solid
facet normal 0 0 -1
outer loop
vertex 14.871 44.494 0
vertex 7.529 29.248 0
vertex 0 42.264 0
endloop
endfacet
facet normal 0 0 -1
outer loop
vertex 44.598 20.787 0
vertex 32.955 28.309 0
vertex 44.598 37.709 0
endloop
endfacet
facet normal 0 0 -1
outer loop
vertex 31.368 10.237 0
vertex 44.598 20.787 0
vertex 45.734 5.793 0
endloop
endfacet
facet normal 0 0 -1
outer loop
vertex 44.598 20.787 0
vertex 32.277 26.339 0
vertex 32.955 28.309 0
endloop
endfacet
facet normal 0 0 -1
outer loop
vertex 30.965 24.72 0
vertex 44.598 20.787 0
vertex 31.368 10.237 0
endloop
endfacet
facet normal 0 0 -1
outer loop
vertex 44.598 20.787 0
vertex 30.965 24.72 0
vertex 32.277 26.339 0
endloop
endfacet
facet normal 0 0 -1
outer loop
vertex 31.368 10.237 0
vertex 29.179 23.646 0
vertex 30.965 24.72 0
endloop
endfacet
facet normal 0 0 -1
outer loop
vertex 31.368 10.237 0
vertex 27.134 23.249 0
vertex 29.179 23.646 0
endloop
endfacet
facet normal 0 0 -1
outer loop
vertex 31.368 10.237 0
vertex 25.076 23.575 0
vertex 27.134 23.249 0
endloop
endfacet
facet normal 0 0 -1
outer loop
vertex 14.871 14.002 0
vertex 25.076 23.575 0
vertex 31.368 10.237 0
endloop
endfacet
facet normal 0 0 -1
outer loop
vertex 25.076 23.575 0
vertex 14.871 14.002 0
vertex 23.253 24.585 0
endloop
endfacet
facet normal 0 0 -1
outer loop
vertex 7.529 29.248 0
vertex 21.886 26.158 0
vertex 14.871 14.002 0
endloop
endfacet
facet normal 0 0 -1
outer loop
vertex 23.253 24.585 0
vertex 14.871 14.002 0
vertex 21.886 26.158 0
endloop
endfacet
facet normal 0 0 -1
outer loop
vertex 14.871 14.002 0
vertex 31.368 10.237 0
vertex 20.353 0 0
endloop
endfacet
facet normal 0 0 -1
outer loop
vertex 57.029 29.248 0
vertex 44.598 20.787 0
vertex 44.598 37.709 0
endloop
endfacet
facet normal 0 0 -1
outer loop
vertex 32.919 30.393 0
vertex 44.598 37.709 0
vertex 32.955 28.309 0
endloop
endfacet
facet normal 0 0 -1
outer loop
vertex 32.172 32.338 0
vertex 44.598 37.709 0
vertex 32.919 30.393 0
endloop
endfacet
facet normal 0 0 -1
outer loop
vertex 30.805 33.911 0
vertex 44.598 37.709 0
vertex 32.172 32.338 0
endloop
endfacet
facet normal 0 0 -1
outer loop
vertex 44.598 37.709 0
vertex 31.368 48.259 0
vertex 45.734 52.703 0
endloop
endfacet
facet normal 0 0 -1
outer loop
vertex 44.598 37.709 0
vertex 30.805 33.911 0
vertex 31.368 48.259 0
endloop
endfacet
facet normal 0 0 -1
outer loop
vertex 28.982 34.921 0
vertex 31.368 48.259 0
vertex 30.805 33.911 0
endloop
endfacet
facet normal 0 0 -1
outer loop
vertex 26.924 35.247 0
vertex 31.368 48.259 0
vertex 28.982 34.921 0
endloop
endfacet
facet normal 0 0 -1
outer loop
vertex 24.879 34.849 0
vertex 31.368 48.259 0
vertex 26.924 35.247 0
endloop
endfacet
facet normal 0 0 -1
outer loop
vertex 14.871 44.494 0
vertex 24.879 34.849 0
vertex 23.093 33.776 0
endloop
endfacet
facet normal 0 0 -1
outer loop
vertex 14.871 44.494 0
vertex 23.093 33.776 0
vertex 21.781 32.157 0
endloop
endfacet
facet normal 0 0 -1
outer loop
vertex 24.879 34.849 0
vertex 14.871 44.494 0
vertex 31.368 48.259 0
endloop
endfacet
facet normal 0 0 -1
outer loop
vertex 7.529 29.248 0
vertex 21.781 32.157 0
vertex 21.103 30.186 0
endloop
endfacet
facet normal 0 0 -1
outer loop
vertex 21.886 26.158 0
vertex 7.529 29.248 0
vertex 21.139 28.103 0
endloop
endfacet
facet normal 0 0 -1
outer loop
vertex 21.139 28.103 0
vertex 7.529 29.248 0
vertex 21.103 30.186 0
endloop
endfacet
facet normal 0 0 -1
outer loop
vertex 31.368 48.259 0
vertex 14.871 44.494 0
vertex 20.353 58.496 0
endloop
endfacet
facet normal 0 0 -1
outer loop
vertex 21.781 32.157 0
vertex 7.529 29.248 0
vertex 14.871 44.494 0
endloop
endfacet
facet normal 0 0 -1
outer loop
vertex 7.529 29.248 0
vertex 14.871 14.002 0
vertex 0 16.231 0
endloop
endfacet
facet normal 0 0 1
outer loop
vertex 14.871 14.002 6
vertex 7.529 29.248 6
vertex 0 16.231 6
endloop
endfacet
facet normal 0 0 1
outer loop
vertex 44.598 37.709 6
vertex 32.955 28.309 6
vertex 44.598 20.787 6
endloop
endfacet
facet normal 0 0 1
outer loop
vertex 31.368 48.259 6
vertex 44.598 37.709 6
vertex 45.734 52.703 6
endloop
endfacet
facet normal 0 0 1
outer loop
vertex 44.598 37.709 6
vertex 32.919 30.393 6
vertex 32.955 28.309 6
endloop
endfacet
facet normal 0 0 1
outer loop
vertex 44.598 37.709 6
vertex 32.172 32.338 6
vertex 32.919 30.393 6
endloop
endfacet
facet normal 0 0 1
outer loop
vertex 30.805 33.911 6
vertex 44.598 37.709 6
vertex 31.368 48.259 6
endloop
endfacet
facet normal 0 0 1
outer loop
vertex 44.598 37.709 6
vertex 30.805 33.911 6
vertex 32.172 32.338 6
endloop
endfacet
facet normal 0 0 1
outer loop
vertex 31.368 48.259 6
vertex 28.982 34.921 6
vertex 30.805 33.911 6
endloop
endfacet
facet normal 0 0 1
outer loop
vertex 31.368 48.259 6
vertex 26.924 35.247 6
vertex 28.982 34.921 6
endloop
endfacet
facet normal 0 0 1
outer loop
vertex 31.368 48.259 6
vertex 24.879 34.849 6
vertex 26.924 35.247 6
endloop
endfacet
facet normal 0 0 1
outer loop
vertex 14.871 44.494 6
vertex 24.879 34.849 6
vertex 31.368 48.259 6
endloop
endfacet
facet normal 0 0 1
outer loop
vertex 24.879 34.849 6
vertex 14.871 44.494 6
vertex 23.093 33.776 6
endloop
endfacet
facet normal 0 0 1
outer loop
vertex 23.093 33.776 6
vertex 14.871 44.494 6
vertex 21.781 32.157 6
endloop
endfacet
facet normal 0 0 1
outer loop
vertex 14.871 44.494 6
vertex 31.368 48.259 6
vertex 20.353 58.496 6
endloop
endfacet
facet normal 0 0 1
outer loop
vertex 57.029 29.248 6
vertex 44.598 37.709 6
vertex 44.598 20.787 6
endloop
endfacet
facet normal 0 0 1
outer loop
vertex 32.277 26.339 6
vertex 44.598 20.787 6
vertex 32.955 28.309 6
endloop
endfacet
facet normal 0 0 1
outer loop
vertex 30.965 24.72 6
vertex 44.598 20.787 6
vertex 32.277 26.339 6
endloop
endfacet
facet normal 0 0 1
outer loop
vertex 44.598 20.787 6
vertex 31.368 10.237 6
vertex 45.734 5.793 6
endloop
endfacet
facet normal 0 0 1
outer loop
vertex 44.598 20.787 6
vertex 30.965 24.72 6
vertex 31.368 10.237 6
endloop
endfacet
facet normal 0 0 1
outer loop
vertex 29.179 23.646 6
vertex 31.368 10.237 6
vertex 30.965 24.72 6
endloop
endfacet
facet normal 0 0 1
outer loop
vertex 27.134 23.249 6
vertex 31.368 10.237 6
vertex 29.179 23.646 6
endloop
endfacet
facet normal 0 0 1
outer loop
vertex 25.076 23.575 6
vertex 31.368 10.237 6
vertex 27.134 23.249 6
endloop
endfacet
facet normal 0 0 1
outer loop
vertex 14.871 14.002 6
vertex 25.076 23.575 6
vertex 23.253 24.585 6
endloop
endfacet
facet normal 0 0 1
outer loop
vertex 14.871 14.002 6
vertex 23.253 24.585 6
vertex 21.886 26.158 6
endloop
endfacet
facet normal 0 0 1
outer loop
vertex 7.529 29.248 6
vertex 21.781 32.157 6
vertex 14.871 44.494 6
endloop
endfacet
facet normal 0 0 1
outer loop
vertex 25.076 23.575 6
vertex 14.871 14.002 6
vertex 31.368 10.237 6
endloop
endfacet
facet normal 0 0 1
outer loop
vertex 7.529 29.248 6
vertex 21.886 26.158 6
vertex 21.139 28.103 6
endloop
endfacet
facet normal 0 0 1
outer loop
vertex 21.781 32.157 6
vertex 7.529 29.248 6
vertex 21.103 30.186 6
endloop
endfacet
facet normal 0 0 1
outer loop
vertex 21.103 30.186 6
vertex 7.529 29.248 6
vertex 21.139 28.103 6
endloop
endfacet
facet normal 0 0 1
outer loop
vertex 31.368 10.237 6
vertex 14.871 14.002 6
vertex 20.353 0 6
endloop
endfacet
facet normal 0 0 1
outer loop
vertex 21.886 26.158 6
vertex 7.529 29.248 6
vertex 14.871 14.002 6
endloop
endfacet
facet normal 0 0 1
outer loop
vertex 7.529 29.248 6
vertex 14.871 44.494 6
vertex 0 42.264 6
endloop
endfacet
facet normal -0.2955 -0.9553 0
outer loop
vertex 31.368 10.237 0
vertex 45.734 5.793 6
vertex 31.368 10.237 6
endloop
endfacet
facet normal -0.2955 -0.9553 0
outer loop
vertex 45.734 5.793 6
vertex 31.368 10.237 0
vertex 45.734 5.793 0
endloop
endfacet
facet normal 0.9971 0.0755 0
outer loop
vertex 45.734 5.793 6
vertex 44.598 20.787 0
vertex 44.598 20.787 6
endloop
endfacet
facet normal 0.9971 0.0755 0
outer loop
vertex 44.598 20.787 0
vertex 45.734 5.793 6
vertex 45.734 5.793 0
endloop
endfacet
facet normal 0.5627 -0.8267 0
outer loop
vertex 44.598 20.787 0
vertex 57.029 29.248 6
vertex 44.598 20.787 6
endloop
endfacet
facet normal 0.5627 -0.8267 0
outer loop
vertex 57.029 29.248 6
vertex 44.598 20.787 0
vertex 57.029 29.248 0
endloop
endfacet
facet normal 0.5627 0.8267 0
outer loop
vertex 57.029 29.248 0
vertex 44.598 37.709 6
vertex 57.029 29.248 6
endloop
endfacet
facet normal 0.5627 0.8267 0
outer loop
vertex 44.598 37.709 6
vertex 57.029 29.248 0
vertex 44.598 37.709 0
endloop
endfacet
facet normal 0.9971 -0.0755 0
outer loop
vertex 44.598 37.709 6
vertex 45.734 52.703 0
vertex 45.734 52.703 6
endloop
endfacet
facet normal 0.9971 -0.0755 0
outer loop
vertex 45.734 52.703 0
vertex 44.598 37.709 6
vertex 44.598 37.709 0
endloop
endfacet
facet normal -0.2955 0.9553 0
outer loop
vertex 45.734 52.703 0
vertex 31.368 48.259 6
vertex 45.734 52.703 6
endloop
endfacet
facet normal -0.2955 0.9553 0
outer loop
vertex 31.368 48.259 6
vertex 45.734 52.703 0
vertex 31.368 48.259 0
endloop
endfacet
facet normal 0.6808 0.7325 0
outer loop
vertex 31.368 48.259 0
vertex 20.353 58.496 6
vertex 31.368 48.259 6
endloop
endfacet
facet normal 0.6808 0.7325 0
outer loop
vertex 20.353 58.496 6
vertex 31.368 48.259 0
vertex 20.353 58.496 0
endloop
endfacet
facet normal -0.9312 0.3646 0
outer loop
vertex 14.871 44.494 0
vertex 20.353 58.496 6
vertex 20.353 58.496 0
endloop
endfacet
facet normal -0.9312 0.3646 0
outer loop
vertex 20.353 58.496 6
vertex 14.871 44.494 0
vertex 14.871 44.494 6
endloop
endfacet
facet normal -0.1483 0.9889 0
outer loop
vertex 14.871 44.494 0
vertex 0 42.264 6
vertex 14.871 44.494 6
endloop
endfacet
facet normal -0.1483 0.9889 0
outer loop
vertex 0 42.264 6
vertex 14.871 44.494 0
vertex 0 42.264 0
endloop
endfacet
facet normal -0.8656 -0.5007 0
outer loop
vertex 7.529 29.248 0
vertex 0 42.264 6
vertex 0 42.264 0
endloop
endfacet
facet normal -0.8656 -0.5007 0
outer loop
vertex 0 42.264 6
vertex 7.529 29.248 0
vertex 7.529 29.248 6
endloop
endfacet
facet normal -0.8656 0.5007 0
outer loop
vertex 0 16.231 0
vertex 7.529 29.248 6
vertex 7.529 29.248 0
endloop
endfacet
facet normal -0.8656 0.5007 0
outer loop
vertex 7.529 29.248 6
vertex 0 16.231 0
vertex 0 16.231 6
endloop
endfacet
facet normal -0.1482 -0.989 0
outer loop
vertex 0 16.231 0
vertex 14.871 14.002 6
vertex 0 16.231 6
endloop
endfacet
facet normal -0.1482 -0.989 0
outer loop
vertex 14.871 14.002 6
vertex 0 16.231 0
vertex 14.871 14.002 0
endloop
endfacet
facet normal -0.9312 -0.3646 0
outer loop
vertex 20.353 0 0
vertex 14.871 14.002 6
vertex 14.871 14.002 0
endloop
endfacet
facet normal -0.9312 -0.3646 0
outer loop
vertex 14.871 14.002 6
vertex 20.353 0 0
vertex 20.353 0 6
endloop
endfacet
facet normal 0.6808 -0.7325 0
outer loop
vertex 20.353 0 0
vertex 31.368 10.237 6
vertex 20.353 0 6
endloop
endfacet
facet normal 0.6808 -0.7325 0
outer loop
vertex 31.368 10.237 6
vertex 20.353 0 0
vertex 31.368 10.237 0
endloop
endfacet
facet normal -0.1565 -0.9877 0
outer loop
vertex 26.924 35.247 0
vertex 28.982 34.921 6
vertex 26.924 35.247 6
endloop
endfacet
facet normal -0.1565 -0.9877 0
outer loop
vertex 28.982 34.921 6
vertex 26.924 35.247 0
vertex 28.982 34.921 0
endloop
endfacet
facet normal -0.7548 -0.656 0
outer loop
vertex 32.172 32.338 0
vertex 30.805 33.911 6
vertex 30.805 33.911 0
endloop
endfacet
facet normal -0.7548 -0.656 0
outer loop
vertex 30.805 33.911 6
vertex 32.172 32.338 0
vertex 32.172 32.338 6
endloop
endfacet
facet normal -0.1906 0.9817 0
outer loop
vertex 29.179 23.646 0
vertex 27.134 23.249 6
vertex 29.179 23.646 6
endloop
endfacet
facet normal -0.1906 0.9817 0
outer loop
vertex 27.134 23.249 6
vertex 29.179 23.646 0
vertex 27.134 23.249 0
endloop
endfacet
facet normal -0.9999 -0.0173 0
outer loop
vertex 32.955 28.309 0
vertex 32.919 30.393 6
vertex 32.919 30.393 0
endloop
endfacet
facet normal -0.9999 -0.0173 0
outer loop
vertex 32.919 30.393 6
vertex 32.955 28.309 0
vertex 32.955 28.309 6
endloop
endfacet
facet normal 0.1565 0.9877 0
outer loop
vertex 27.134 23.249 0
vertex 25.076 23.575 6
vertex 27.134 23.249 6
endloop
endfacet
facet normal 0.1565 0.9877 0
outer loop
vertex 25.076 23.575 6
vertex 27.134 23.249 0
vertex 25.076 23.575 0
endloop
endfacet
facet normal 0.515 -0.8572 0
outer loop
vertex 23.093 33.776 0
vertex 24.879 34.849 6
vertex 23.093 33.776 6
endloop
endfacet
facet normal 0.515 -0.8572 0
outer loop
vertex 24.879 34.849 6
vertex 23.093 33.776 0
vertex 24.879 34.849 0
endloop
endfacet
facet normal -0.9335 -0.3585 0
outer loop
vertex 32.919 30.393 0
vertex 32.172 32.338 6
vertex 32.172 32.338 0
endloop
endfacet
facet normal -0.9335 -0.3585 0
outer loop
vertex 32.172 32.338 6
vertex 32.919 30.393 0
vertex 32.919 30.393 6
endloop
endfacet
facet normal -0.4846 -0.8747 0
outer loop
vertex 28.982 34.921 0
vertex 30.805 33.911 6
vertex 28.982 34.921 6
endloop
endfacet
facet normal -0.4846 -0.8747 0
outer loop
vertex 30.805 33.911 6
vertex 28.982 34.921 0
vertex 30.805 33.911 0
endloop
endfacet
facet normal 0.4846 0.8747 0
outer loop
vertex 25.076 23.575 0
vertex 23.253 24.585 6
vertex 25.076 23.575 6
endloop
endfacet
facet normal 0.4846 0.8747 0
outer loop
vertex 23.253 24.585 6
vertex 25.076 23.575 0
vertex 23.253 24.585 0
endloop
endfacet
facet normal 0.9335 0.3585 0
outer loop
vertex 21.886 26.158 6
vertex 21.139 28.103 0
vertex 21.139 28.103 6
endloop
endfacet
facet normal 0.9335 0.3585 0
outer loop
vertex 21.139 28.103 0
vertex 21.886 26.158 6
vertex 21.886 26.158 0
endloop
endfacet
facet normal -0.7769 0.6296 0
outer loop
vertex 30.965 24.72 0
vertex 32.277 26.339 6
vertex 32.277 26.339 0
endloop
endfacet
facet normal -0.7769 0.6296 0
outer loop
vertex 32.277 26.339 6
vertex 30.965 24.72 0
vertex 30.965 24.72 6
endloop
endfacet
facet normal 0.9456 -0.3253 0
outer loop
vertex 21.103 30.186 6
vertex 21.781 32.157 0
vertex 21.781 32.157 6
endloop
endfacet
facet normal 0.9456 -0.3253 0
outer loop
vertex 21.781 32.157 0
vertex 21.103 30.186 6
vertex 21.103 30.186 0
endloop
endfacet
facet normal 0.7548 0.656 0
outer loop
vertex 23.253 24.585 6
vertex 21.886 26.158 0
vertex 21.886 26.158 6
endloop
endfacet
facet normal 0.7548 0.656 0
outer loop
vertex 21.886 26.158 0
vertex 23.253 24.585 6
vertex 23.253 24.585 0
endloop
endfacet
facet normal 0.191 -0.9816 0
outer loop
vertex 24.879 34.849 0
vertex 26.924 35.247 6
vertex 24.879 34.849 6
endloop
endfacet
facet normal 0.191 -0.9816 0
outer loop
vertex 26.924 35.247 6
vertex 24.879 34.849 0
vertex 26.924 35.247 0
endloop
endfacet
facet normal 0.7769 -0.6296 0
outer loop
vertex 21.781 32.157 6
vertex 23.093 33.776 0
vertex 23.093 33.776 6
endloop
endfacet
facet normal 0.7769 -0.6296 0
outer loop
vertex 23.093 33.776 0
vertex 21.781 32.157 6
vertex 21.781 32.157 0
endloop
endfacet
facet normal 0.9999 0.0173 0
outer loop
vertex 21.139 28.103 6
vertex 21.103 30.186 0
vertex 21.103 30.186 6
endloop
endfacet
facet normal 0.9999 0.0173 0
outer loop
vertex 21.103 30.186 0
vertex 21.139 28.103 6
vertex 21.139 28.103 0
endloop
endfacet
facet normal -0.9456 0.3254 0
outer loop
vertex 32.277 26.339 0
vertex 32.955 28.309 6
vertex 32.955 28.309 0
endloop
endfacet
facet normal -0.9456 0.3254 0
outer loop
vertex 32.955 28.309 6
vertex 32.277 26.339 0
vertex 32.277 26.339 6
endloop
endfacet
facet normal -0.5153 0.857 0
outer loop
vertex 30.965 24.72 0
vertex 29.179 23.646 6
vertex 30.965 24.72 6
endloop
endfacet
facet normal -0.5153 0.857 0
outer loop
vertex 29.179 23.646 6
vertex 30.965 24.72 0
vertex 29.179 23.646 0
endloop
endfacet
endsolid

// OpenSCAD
$fn = 32;

// ----------------------------------------------------------------------
// Star wheel: 7-point blunt, R30
// ----------------------------------------------------------------------

// --- parameters (mm) ---
n_points = 7;             // number of points / teeth
r_out = 30;               // tip radius
r_in = 19.5;              // root radius
bore_r = 6;               // centre bore radius
plate_t = 6;              // plate thickness, Z (extrusion height)
bore_d = 12;              // centre bore diameter
fit_tol = 0.05;           // declared fit tolerance (prompt contract)
free_tol = 0.3;           // declared free tolerance (prompt contract)

profile = [[57.029, 29.248], [44.598, 37.709], [45.734, 52.703], [31.368, 48.259], [20.353, 58.496], [14.871, 44.494], [0, 42.264], [7.529, 29.248], [0, 16.231], [14.871, 14.002], [20.353, 0], [31.368, 10.237], [45.734, 5.793], [44.598, 20.787]];  // primary outline, 14 points, counter clockwise
void_1 = [[32.919, 30.393], [32.172, 32.338], [30.805, 33.911], [28.982, 34.921], [26.924, 35.247], [24.879, 34.849], [23.093, 33.776], [21.781, 32.157], [21.103, 30.186], [21.139, 28.103], [21.886, 26.158], [23.253, 24.585], [25.076, 23.575], [27.134, 23.249], [29.179, 23.646], [30.965, 24.72], [32.277, 26.339], [32.955, 28.309]];  // centre bore, 18 points

// --- the one profile operation ---
difference() {
  linear_extrude(height = plate_t) polygon(points = profile);
  translate([0, 0, -1])
    linear_extrude(height = plate_t + 2) polygon(points = void_1);
}
